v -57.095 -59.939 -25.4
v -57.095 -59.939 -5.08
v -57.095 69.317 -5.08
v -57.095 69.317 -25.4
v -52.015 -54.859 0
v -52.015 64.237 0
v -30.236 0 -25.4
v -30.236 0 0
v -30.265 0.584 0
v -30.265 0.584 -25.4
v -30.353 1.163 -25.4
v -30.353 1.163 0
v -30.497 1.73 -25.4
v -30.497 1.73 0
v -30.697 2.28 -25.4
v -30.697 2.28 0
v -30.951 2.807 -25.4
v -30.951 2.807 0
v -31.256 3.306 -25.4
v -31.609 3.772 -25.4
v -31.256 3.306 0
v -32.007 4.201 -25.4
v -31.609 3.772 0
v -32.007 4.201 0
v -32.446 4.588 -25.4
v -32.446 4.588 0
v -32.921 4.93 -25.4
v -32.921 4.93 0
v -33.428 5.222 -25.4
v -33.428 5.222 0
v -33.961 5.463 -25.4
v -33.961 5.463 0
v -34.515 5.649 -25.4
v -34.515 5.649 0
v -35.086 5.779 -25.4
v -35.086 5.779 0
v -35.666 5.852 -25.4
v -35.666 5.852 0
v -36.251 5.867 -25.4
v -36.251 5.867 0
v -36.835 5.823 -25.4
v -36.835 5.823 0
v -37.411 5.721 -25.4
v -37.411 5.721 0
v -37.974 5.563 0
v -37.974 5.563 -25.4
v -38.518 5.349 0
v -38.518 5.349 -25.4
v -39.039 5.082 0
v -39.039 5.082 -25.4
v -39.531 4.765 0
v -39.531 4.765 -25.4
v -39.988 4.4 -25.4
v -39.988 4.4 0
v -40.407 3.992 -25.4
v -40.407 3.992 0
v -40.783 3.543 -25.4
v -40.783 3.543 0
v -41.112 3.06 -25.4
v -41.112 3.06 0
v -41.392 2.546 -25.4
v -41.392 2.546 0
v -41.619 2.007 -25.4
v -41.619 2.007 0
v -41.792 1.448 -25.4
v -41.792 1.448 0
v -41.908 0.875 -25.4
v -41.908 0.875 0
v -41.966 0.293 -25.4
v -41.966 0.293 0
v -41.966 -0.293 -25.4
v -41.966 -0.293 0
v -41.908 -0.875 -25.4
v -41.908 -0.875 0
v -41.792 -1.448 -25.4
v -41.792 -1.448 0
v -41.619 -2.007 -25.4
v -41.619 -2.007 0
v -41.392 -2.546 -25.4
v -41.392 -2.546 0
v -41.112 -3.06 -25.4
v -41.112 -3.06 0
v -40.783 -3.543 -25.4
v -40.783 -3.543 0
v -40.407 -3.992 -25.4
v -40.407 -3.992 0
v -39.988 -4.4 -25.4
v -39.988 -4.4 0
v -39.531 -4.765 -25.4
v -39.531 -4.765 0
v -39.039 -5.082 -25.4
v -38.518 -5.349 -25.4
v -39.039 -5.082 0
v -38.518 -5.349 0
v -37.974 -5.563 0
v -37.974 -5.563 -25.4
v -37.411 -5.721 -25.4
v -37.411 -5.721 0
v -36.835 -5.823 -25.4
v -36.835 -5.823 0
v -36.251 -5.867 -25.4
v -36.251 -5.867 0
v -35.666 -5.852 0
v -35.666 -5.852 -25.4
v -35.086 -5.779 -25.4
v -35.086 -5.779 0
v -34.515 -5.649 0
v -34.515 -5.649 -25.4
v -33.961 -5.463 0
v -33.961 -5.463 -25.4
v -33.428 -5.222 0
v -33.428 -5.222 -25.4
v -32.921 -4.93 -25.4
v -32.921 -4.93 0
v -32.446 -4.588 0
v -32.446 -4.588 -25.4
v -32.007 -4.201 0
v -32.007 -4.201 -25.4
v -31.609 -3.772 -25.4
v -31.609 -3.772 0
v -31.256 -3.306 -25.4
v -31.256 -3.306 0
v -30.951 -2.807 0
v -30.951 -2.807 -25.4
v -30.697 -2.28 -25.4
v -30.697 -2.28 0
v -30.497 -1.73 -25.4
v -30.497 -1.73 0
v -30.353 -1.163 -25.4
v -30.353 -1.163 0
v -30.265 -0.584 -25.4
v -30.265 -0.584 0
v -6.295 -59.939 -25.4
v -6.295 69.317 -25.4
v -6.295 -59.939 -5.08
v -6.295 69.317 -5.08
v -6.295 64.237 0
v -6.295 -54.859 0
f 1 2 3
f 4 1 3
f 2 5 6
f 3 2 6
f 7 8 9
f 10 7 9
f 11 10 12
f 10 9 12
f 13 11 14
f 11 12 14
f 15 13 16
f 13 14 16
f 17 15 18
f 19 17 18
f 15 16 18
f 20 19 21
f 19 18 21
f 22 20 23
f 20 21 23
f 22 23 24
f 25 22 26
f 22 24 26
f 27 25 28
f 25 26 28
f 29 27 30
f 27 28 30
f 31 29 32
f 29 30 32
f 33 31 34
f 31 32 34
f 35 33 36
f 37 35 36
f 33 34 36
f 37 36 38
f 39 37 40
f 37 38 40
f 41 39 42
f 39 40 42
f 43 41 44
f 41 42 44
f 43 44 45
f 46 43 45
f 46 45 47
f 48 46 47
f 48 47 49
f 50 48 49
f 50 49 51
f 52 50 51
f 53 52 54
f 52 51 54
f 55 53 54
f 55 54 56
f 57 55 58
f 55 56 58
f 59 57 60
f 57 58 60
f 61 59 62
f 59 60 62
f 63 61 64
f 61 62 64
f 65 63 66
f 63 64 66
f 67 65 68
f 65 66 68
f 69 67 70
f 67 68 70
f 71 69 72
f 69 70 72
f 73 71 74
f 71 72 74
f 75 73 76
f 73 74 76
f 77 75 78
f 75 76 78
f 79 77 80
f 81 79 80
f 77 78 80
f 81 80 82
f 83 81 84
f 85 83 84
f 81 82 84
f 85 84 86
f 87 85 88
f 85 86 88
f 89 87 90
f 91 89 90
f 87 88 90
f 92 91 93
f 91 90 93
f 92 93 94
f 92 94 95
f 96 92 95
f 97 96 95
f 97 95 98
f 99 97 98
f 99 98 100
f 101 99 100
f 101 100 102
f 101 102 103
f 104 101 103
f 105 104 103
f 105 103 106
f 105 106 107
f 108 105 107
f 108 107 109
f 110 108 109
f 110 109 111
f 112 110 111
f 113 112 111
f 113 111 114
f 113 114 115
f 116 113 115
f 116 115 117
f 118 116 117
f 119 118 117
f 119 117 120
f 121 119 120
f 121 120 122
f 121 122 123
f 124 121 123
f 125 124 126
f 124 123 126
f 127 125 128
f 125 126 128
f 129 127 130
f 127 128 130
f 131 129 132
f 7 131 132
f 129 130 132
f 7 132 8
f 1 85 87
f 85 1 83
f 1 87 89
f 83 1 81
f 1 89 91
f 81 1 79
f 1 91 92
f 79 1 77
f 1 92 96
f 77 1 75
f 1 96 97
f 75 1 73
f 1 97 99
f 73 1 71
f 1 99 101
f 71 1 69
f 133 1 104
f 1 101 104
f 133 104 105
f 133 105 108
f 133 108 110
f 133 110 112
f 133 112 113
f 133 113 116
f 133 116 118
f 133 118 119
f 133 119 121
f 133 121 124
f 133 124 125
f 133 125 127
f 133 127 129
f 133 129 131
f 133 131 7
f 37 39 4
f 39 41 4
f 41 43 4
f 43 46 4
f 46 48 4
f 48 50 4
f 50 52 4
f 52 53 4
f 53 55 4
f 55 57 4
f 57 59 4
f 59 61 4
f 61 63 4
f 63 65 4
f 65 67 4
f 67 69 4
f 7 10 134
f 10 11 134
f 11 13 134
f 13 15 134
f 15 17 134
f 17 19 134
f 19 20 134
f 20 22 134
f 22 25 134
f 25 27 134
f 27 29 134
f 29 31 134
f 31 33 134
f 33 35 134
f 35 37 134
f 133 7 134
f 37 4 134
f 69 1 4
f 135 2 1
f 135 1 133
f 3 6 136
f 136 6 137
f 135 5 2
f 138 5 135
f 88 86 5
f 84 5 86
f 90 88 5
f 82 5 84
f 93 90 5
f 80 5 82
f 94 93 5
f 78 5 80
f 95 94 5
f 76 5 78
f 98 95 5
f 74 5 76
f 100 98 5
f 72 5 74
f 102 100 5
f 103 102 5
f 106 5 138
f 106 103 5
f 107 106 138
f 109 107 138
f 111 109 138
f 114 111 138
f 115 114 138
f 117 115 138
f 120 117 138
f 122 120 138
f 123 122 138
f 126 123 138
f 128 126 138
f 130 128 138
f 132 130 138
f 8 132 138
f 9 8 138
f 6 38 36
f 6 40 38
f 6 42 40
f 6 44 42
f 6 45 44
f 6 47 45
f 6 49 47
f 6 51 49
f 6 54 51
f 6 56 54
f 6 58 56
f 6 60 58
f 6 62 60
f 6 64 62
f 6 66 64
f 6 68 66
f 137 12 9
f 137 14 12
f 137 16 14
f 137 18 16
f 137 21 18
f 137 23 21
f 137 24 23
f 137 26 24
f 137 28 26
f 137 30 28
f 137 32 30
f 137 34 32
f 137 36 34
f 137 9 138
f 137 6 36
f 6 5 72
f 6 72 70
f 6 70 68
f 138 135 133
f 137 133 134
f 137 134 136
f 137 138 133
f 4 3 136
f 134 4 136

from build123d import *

# Parameters (mm, degrees)
F0_W     = 50.8
F0_H     = 129.256198
F1_DEPTH = 25.4
F2_SIZE  = 5.08
F3_R     = 5.868493
F4_DEPTH = 25.4


with BuildPart() as f1:
    # F0 (on Top) → F1 (new body)
    with BuildSketch(Plane.XY):
        with Locations((-31.694914, 4.688799)):
            Rectangle(F0_W, F0_H)
    extrude(amount=-F1_DEPTH)

    # F2
    f2_edges = [f1.edges().sort_by_distance(p)[0] for p in [
        (-57.094914, 4.688799, 0),
        (-31.694914, -59.9393, 0),
        (-31.694914, 69.316898, 0),
    ]]
    chamfer(f2_edges, length=F2_SIZE)

    # F3 (on face) → F4 (cut)
    with BuildSketch(Plane.XY):
        with Locations((-36.104809, 0)):
            Circle(F3_R)
    extrude(amount=-F4_DEPTH, mode=Mode.SUBTRACT)


solid = f1.part
